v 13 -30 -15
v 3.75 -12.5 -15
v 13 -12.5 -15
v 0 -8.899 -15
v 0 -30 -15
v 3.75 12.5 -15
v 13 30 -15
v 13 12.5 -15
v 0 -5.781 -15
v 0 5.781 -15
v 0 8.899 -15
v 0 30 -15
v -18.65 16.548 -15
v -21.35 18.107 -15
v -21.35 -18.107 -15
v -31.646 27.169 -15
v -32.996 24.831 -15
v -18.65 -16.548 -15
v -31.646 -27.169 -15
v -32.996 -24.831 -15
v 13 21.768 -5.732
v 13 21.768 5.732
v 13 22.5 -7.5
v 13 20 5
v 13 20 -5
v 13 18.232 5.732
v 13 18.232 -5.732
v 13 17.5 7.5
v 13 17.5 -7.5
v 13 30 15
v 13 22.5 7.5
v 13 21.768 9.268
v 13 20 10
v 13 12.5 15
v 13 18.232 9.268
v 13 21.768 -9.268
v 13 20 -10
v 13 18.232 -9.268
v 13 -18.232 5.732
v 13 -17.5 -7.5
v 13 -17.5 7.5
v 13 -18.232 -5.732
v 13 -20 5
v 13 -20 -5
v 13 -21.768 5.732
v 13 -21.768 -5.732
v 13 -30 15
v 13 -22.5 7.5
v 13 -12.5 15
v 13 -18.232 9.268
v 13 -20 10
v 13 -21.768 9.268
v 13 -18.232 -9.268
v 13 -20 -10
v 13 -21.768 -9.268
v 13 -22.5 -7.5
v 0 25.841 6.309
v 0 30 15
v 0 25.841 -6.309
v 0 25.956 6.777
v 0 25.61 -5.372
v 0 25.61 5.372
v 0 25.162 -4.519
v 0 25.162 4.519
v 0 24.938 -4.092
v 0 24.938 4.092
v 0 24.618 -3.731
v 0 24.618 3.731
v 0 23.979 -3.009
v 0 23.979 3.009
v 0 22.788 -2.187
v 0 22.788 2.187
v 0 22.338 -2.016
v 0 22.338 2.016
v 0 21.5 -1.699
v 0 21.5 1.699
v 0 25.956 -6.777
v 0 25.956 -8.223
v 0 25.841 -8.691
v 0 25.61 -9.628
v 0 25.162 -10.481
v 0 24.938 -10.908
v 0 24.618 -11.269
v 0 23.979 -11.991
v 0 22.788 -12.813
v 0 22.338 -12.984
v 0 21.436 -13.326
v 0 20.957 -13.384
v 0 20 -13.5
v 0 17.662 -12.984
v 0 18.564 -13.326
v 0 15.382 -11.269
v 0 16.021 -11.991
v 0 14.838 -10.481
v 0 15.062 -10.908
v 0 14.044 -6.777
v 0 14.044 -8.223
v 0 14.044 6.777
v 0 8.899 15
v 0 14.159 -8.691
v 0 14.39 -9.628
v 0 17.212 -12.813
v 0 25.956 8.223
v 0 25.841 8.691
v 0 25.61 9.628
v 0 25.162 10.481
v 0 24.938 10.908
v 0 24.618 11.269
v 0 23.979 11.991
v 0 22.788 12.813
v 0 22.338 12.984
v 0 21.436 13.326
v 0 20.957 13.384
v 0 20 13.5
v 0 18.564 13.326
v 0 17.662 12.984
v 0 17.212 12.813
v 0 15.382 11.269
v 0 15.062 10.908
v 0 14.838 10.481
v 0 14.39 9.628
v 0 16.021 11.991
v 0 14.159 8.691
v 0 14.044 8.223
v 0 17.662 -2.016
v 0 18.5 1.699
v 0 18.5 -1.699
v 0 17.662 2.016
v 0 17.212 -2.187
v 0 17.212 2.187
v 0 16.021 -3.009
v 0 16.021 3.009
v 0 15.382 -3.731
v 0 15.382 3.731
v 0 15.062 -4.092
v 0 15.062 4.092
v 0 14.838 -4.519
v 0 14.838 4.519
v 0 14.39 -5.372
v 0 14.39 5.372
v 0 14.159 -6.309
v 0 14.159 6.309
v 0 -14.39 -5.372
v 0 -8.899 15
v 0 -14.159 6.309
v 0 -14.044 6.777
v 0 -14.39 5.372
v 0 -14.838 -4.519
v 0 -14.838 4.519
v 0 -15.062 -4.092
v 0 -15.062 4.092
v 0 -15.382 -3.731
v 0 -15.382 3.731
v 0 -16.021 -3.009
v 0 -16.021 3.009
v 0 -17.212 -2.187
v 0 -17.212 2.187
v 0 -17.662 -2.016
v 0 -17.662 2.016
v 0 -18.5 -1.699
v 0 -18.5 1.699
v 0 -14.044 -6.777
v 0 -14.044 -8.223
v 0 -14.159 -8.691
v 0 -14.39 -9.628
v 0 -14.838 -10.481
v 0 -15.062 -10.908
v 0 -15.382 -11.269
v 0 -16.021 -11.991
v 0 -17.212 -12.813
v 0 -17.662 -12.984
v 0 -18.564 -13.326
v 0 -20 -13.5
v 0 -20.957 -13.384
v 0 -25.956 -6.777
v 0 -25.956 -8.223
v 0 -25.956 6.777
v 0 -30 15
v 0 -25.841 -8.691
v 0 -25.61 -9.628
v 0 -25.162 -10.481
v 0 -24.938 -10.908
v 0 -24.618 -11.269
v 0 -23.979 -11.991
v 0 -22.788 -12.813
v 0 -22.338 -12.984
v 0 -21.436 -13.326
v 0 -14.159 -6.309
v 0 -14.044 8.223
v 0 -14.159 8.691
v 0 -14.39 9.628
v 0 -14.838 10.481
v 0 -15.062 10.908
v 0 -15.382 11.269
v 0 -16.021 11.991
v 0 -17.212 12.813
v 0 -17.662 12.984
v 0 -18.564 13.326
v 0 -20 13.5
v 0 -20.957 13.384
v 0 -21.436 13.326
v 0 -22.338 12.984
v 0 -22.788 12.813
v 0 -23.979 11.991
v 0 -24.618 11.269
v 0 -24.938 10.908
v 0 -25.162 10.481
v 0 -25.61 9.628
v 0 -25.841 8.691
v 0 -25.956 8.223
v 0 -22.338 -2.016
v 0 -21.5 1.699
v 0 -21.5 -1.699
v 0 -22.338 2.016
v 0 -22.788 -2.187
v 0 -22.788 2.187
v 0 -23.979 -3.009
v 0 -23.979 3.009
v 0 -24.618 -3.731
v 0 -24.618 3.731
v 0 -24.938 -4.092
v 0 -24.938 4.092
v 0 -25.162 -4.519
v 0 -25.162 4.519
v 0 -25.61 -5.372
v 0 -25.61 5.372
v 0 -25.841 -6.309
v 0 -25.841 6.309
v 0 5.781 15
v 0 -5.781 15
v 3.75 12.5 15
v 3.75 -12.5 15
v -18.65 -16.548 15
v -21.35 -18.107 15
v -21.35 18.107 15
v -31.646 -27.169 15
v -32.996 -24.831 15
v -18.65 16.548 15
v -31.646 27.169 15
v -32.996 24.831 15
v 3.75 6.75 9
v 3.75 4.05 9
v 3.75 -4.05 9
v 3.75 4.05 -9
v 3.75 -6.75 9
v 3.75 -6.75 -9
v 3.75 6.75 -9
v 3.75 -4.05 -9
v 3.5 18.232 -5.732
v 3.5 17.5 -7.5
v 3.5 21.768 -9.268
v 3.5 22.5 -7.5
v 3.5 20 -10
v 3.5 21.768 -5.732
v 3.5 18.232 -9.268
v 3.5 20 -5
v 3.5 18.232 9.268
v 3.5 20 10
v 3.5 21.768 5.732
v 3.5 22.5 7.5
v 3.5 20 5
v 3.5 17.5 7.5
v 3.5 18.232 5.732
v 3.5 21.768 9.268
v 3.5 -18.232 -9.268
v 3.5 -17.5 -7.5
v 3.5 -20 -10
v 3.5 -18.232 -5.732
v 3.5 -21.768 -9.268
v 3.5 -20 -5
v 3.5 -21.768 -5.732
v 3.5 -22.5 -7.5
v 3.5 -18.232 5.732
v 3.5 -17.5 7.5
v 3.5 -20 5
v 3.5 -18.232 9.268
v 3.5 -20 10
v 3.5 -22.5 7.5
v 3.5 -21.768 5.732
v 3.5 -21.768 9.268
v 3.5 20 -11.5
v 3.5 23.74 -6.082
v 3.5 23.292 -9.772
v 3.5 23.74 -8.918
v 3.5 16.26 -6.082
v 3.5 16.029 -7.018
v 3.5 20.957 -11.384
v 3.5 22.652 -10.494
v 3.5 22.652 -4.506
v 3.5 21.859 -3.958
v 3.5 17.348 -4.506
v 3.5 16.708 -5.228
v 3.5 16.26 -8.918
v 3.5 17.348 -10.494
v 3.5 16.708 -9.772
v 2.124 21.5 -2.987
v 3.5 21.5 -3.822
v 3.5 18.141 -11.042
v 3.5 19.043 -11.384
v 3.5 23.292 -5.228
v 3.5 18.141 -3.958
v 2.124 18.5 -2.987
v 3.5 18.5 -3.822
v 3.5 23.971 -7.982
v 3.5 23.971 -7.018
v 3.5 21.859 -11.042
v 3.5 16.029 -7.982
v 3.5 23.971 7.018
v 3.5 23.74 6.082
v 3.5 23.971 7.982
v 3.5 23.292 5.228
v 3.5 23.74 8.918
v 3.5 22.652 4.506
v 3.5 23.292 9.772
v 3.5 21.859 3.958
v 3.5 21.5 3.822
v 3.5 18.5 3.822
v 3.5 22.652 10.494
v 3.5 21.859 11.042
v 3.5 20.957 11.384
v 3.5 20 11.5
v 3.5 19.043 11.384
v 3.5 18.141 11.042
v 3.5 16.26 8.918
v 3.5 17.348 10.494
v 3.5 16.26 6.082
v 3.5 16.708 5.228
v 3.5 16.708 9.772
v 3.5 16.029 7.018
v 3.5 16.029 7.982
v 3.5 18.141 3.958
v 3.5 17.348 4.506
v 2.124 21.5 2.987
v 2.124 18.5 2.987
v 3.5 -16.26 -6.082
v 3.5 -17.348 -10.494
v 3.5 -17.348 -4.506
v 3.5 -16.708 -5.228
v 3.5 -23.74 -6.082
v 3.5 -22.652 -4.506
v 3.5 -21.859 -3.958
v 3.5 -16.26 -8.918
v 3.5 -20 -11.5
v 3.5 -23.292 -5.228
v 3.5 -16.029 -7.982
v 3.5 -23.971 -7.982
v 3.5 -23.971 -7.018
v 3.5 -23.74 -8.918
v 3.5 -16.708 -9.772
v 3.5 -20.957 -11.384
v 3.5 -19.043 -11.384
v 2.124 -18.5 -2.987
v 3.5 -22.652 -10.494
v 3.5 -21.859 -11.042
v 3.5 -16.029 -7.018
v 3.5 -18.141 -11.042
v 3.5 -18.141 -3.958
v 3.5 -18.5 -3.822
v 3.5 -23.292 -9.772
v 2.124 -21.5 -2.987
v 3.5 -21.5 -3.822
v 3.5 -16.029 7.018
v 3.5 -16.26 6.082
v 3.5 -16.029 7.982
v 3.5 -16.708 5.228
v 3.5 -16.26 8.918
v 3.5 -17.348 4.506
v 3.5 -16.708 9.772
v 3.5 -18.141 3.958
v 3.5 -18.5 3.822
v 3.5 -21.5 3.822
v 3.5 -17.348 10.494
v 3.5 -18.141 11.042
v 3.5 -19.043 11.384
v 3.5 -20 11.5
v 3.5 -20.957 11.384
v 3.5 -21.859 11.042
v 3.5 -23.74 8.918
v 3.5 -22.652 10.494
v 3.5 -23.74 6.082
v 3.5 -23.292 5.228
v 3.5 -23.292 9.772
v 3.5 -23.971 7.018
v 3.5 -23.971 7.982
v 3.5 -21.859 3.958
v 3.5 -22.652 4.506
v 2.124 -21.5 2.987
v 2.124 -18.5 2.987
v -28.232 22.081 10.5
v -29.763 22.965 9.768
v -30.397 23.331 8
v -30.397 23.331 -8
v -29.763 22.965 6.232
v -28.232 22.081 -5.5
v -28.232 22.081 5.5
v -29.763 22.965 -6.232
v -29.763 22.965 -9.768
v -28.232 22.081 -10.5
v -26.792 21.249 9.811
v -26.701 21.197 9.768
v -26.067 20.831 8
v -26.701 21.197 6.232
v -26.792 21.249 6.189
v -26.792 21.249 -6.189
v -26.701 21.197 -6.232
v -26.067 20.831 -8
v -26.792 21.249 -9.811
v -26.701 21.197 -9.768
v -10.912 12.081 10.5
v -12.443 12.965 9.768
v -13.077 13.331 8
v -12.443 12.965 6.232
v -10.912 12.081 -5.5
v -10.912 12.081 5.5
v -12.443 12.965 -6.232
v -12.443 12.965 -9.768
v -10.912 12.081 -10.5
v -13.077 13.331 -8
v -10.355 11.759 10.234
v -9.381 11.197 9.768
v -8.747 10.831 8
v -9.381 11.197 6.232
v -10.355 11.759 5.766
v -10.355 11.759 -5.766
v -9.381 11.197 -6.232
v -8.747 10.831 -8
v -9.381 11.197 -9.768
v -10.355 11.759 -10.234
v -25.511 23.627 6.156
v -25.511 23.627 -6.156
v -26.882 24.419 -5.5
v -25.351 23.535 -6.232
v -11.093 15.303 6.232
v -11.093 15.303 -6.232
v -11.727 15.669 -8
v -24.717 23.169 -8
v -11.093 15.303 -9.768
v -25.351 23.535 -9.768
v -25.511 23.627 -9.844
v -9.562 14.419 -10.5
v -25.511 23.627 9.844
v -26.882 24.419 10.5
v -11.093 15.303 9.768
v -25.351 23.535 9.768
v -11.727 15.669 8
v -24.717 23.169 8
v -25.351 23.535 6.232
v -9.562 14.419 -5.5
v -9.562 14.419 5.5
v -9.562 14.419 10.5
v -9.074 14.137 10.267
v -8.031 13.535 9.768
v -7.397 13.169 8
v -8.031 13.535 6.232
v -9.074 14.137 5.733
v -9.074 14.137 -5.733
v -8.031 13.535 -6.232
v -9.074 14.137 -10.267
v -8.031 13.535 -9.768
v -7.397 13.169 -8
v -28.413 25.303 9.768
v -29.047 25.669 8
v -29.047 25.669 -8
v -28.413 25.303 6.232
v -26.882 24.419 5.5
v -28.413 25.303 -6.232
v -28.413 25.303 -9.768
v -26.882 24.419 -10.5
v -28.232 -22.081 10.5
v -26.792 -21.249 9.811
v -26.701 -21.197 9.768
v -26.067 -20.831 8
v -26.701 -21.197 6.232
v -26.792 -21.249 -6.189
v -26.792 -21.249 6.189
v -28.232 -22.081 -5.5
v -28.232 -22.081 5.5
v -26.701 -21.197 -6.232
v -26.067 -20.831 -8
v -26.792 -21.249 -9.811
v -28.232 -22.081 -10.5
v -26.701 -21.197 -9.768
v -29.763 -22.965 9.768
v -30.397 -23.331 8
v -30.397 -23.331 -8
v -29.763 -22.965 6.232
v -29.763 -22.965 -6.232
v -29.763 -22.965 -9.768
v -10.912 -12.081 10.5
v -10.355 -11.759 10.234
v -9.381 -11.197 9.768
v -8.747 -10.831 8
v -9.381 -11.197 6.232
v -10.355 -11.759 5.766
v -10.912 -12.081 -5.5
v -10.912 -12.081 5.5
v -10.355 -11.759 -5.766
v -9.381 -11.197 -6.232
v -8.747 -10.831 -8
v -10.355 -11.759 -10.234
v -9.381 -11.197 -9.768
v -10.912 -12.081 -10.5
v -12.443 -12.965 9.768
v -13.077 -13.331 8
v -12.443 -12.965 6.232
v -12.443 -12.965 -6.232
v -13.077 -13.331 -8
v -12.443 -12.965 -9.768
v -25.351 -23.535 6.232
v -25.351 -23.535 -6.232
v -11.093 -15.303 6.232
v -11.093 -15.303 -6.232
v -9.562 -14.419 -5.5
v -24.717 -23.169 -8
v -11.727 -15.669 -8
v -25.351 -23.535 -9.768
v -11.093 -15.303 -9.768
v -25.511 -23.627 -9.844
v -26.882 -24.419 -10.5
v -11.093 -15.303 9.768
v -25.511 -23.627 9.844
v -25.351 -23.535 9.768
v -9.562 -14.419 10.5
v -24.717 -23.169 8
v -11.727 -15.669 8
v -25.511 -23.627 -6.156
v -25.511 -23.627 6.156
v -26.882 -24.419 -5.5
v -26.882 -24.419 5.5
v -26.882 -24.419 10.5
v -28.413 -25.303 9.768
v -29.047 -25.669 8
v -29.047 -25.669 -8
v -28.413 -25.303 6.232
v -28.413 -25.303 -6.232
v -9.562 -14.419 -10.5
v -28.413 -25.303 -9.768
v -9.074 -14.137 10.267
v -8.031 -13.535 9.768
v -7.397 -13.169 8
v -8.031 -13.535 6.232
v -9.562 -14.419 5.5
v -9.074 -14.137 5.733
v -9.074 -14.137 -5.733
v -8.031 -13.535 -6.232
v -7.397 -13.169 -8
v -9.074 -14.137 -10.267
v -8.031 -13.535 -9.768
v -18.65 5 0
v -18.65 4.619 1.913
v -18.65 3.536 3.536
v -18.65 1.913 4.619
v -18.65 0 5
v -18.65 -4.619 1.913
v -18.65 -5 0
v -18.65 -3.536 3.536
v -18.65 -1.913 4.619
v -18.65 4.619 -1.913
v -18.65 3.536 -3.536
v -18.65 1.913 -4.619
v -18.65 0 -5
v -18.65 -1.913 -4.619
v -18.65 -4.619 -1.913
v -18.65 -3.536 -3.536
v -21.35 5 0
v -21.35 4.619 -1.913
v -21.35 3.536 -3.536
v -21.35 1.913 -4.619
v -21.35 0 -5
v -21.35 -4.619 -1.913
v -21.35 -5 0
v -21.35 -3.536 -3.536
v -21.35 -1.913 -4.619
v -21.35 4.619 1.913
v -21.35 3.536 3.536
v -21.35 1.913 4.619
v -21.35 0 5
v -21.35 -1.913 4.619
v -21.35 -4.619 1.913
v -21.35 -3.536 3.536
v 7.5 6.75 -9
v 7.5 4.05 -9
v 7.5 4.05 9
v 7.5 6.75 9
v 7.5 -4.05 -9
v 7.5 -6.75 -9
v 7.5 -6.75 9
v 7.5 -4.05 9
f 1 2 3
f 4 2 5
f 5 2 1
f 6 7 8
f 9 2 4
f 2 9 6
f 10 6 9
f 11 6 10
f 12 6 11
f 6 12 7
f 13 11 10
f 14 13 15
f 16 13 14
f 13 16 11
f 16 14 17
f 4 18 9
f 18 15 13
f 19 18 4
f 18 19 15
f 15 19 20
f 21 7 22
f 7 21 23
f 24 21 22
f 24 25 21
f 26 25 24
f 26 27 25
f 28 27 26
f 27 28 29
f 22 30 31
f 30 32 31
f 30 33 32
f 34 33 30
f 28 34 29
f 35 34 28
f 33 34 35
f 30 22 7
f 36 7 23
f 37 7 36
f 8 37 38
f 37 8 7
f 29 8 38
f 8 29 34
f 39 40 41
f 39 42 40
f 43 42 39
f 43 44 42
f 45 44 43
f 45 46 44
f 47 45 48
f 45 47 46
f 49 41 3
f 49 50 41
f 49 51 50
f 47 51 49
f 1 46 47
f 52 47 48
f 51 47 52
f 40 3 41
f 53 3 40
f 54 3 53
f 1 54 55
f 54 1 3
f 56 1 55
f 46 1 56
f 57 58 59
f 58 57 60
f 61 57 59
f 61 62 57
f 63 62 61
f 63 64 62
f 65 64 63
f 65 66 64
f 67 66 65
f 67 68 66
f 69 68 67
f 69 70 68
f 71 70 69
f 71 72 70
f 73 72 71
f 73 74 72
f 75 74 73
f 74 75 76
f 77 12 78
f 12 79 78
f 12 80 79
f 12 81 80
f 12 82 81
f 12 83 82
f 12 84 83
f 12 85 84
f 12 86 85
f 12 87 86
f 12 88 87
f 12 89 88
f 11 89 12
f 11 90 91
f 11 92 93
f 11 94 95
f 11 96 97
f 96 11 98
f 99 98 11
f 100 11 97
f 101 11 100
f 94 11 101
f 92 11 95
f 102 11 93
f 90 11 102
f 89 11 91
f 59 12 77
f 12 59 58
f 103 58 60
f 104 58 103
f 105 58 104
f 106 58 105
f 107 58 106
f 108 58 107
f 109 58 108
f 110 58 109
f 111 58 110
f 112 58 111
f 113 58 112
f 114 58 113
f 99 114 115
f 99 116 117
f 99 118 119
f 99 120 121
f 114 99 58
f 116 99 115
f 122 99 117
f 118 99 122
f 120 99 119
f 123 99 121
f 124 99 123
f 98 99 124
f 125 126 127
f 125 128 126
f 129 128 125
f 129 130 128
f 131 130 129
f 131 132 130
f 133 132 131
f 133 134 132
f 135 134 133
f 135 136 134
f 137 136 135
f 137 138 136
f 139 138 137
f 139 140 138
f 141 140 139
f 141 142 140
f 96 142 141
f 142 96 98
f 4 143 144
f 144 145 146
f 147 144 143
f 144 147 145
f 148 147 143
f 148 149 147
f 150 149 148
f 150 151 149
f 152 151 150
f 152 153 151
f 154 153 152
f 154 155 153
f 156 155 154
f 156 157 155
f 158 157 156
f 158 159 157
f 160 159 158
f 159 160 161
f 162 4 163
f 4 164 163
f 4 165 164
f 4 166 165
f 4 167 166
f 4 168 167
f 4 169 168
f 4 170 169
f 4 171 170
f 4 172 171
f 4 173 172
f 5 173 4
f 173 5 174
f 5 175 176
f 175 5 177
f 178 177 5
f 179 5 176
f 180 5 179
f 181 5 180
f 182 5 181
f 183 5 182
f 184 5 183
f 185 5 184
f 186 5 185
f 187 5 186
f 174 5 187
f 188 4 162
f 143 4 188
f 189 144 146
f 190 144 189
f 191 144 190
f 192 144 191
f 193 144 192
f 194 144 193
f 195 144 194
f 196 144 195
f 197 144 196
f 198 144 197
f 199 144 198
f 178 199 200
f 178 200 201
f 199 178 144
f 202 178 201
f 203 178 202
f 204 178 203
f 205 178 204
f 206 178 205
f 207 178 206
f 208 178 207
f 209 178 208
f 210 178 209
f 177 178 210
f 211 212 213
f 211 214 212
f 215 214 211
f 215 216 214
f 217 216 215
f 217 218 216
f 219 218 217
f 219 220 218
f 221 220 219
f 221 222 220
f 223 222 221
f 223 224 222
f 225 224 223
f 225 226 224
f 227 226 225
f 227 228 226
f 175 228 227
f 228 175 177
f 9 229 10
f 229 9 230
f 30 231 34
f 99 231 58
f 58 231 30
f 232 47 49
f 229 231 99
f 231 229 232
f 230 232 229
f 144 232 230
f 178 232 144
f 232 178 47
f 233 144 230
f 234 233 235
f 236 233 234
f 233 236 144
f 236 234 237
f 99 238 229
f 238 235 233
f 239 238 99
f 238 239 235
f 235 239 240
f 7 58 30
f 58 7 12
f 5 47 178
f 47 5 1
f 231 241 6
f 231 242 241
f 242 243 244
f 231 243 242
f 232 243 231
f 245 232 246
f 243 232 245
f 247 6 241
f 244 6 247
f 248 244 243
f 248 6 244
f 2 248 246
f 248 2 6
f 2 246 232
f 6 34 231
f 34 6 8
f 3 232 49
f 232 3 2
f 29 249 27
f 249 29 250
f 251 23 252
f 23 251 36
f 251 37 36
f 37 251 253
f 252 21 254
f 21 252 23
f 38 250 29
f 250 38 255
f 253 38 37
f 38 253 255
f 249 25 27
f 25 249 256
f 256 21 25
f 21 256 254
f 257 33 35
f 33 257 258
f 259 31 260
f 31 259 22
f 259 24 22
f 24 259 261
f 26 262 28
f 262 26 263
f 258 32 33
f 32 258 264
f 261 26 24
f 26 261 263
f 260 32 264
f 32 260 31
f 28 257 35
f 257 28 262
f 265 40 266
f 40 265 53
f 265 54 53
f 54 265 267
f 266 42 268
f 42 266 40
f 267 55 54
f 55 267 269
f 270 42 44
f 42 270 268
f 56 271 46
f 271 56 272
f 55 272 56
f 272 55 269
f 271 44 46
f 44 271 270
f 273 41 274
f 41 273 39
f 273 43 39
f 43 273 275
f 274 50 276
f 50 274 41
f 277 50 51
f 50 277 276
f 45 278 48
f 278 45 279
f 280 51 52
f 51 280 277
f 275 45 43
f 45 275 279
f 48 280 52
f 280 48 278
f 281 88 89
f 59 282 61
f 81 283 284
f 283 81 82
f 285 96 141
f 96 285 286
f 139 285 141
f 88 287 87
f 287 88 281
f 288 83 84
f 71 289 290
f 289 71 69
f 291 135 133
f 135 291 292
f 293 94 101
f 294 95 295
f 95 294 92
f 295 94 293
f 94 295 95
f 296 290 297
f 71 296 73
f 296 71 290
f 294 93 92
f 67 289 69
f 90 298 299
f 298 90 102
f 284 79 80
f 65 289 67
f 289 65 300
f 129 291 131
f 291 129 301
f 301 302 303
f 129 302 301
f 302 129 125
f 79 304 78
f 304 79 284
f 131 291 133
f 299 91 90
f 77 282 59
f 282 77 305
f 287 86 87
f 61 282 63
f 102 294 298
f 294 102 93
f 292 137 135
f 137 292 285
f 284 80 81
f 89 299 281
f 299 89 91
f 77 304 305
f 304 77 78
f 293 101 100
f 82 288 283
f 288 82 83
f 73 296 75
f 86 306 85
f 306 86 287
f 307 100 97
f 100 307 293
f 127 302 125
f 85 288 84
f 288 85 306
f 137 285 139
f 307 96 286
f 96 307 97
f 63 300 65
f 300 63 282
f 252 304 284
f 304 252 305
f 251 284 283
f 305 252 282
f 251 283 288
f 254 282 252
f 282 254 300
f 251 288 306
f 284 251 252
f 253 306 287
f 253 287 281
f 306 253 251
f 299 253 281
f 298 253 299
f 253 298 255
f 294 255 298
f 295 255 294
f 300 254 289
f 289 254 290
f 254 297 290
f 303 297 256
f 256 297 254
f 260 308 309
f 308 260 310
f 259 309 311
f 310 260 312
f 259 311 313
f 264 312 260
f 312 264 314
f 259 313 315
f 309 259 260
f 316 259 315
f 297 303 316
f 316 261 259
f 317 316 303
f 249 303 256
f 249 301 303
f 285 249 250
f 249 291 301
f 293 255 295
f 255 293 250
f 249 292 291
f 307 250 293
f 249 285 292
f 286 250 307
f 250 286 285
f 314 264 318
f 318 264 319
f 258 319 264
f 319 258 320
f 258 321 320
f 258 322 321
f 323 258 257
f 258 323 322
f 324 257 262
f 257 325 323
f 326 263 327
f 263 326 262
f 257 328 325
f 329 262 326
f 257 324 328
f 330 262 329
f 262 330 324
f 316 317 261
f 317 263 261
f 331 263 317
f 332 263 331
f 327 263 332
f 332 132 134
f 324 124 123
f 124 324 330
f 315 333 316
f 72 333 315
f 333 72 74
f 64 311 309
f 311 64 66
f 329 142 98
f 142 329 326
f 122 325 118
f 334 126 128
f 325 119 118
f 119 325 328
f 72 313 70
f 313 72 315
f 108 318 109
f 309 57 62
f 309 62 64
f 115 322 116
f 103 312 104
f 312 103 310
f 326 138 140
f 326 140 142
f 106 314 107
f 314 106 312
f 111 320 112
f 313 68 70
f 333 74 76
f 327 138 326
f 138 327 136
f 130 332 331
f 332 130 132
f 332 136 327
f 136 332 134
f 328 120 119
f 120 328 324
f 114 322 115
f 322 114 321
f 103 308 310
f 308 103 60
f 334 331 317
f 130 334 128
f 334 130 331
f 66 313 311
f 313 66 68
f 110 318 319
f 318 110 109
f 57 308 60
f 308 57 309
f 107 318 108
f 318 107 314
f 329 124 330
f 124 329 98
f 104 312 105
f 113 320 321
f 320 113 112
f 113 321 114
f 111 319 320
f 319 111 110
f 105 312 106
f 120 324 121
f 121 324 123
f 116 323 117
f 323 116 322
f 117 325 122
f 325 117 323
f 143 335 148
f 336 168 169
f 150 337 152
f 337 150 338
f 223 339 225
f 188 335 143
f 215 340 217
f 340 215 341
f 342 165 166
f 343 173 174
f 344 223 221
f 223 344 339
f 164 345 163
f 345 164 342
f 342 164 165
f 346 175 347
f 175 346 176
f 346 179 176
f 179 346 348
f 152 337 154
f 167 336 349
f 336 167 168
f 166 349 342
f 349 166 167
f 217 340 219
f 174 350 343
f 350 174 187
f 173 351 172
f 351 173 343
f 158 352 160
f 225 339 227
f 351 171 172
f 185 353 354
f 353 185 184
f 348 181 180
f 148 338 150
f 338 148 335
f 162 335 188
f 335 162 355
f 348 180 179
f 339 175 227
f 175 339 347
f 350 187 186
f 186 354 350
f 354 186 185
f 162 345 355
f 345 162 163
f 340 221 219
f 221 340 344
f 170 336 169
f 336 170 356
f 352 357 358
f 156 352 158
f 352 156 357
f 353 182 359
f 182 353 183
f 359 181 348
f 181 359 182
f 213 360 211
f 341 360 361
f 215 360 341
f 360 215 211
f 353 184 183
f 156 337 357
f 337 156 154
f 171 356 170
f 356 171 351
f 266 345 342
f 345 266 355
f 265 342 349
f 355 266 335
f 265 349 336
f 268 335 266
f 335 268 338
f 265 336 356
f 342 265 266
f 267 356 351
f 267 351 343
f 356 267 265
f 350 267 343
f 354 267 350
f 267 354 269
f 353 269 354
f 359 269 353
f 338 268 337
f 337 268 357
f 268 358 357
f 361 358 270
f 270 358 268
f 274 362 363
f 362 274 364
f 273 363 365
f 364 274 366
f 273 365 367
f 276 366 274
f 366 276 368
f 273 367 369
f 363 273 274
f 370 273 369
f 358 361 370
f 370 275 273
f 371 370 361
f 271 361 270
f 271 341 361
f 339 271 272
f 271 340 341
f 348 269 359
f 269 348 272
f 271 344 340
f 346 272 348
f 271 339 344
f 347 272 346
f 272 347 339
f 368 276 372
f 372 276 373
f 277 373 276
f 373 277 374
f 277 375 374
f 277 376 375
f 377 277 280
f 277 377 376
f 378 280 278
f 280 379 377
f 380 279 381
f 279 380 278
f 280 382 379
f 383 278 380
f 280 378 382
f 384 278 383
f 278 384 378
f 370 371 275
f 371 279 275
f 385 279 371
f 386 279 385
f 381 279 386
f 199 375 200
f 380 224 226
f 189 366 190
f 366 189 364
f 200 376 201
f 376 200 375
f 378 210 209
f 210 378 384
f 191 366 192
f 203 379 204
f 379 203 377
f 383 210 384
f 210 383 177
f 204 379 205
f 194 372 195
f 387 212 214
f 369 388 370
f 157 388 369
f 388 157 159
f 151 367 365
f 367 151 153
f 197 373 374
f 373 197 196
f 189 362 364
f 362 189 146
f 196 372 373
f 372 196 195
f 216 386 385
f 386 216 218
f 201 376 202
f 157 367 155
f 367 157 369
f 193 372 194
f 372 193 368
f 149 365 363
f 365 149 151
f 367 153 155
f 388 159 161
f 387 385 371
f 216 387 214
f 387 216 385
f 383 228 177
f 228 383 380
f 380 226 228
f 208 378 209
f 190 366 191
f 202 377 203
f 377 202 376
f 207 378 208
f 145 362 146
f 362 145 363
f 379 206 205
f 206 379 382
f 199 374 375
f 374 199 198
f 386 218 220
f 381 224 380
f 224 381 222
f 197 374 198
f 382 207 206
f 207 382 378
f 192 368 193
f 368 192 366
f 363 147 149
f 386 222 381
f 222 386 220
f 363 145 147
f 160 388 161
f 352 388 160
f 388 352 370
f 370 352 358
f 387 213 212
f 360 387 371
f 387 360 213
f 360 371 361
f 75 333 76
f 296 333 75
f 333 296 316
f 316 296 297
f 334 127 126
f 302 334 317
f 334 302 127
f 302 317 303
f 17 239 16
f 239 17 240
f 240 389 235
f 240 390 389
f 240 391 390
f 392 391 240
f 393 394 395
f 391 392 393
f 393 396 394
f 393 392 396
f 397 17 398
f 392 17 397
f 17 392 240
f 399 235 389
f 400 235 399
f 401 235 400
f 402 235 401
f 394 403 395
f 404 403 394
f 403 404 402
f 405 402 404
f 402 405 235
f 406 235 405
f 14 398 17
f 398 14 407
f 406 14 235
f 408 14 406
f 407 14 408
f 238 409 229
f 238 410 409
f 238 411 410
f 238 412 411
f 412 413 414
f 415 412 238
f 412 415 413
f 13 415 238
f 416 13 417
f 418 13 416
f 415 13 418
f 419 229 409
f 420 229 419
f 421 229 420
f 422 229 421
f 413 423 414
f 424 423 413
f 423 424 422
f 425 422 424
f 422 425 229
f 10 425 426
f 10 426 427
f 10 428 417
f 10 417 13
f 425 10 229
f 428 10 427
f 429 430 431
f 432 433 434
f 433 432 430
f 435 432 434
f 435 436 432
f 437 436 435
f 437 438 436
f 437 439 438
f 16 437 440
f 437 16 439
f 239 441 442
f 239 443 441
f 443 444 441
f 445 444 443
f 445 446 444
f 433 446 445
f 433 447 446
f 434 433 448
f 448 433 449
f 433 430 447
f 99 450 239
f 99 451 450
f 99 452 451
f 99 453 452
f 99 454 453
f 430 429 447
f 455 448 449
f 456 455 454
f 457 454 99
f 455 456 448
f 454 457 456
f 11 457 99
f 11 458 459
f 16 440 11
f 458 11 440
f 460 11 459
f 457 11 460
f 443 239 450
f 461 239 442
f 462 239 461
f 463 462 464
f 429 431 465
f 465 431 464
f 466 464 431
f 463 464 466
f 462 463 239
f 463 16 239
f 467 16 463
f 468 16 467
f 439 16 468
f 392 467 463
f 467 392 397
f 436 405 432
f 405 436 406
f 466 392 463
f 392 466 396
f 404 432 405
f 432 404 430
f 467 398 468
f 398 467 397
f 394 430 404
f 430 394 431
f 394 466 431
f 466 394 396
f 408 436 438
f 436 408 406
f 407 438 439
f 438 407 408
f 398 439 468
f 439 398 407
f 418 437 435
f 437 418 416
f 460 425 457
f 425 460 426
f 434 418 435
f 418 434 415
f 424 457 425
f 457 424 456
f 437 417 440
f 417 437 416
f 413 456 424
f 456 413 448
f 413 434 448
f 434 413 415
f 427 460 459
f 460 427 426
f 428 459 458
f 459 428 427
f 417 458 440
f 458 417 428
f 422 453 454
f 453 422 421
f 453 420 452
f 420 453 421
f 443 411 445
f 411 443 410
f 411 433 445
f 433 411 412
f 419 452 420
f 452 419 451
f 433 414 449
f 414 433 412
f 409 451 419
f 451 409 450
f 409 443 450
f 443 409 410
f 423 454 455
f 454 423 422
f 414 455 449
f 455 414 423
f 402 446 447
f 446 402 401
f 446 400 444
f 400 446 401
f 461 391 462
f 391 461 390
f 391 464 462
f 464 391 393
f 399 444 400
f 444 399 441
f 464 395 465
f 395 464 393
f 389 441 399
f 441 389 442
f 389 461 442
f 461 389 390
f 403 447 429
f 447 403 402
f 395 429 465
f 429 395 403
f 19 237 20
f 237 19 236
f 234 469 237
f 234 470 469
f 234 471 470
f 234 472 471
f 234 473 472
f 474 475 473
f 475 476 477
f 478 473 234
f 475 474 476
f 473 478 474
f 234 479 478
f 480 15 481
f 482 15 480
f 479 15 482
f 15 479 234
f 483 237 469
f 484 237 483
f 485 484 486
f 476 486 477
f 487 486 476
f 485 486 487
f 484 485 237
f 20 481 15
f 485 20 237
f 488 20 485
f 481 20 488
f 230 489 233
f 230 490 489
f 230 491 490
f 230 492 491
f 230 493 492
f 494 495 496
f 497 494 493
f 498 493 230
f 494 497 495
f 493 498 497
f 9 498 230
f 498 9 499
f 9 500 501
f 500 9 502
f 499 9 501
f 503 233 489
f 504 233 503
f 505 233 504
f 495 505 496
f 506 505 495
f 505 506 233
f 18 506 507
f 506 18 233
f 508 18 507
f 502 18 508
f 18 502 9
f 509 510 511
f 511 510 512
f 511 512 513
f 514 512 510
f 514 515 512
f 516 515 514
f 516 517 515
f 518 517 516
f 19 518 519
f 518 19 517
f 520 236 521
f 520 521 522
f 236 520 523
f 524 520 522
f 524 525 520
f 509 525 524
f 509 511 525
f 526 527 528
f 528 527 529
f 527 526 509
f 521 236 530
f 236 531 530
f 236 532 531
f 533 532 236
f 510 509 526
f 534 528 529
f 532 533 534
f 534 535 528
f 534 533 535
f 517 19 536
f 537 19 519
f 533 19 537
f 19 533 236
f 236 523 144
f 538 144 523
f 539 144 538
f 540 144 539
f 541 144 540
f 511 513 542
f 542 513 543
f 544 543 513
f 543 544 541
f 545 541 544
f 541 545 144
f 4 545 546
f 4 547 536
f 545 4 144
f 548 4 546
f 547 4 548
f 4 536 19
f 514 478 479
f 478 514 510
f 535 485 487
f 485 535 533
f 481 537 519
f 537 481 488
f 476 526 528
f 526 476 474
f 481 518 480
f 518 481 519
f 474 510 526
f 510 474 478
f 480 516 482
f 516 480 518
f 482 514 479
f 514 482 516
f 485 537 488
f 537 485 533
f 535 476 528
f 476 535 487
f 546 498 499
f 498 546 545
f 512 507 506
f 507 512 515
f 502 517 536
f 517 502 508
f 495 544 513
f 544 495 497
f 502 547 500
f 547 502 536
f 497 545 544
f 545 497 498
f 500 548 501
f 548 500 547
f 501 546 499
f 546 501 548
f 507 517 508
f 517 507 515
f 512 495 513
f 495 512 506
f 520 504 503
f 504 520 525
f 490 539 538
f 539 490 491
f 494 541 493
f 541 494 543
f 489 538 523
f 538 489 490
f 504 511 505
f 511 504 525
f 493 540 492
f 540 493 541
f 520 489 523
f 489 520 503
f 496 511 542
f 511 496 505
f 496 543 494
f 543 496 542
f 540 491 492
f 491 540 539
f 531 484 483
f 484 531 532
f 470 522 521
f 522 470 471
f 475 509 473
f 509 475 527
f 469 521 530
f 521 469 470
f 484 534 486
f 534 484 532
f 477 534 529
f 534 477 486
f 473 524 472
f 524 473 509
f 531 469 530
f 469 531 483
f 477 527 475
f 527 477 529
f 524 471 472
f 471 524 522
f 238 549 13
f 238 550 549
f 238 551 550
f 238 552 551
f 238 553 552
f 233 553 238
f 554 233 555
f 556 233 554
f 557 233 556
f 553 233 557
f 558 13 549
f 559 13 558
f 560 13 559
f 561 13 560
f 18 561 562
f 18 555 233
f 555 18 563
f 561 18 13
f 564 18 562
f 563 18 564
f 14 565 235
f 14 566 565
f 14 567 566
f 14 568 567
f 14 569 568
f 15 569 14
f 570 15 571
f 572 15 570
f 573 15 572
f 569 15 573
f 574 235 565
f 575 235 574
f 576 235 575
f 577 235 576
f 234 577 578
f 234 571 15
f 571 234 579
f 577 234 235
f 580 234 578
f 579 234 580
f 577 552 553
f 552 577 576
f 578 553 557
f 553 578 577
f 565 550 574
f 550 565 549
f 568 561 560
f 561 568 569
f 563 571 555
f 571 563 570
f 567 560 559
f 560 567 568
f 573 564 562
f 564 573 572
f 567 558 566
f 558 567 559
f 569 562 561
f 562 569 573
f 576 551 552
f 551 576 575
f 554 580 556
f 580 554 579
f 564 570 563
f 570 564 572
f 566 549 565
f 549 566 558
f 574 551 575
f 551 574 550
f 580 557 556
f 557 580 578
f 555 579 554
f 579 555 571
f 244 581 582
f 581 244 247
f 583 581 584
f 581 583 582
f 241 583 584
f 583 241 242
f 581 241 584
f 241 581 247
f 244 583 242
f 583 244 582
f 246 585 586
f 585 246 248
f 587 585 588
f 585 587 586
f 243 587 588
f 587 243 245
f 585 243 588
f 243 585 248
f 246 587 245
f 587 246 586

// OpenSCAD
// Gen1_delta clamp
//block shape
x=30;
y=60;
z=13;

// track channel
f=x+10;
g=25;
h=9.5;
// block top
e=20;
r=y+10;
t=16.5;

// spacing of screw holes
cx=15;
cy=40;
dx=15;
dy=45;

// rotation
gx=90;

rotate([0,gx,0])
difference()
{
    translate([0,0,z]/2) cube ([x,y,z],center=true);
    translate([0,0,z+4]/2) cube([f,g,h],center=true);
 
  translate([cx,cy,0]/2) cylinder(d=5, h=50,  center=true);
  translate([-cx,cy,0]/2) cylinder(d=5, h=50,  center=true);
    translate([cx,-cy,0]/2) cylinder(d=5, h=50,  center=true);
    translate([-cx,-cy,0]/2) cylinder(d=5, h=50,  center=true);
  translate([dy,dy,0]/2) cylinder(d=5, h=50,  center=true);
  translate([-dy,dy,0]/2) cylinder(d=5, h=50,  center=true);
    translate([dy,-dy,0]/2) cylinder(d=5, h=50,  center=true);
    translate([-dy,-dy,0]/2) cylinder(d=5, h=50,  center=true);  
    translate([dy,dx,0]/2) cylinder(d=5, h=50,  center=true);
  translate([-dy,dx,0]/2) cylinder(d=5, h=50,  center=true);  
  translate([dy,-dx,0]/2) cylinder(d=5, h=50,  center=true);
  translate([-dy,-dx,0]/2) cylinder(d=5, h=50,  center=true);  
    
 translate([cx,cy,0]/2)  cylinder(d1=16, d2=8, h=7,  center=true);
 translate([-cx,cy,0]/2) cylinder(d1=16, d2=8, h=7, center=true);
    translate([cx,-cy,0]/2) cylinder(d1=16, d2=8, h=7,  center=true);
    translate([-cx,-cy,0]/2) cylinder(d1=16, d2=8, h=7,  center=true);    
// zip tie knotches    
    translate([0,-cy/2,11.5-10]) cube([18,3,4],center=true);
    translate([0,cy/2,11.5-10]) cube([18,3,4],center=true);
// removal knotches
//       translate([0,-(6.8+51)/2,11.5]) cube([8,3,4],center=true);
//   translate([0,(6.8+51)/2,11.5-10]) cube([8,3,4],center=true);
//   translate([(6.8+51)/2,0,11.5-11]) cube([3,8,2],center=true);
  // translate([-(6.8+51)/2,0,11.5-11]) cube([3,8,2],center=true);
}

//blocks for  sides of delta
difference(){
translate([-15,16,0])
rotate([0,0,150])
cube([40,2.7,30],center=true);
// top holes
    translate([-15,45,-8])  
  rotate([90,0,150]) 
    cylinder(d=5, h=60, center=true);
      translate([-15,5,-8])rotate([90,0,150]) cylinder(d=5, h=60, center=true);
      translate([-15,5,8])rotate([90,0,150]) cylinder(d=5, h=60, center=true);
     translate([-15,45,8])rotate([90,0,150]) cylinder(d=5, h=60, center=true);

};
difference (){
translate([-15,-16,0])
rotate([0,0,-150])
cube([40,2.7,30],center=true);
        translate([-15,-45,-8])  
  rotate([90,0,-150]) 
    cylinder(d=5, h=60, center=true);
      translate([-15,-5,-8])rotate([90,0,-150]) cylinder(d=5, h=60, center=true);
      translate([-15,-5,8])rotate([90,0,-150]) cylinder(d=5, h=60, center=true);
     translate([-15,-45,8])rotate([90,0,-150]) cylinder(d=5, h=60, center=true);
    
};
//cross braceing
    translate([-20,0,0])difference (){
cube([2.7,38,30],center=true);rotate([0,90,0])
      cylinder(d=10,h=10,center=true);  
    };
  //plate for 5 bolt holes
// rotate([0,gx,0])
//difference () {
//  
//    translate([15,0,-1]) cube([4,60,28],center=true);
//    translate([0,0,-8])rotate([90,0,90]) cylinder(d=5, h=60, center=true);
//      translate([-9,20,-8])rotate([90,0,90]) cylinder(d=5, h=60, center=true);
//      translate([8,-20,-8])rotate([90,0,90]) cylinder(d=5, h=60, center=true);
  //      translate([-9,10,-8])rotate([90,0,90]) cylinder(d=5, h=60, center=true);
//      translate([8,-10,-8])rotate([90,0,90]) cylinder(d=5, h=60, center=true);
   //notch to keep opening for C-channel
  //  translate([15,0,11.25]) cube([5,25,15],center=true);
//}
// tabs for slots

rotate([0,gx,0])  translate([0,(6.8+4)/2,z-8]) cube([18,2.7,5],center=true);
rotate([0,gx,0])  translate([0,-(6.8+4)/2,z-8]) cube([18,2.7,5],center=true);
